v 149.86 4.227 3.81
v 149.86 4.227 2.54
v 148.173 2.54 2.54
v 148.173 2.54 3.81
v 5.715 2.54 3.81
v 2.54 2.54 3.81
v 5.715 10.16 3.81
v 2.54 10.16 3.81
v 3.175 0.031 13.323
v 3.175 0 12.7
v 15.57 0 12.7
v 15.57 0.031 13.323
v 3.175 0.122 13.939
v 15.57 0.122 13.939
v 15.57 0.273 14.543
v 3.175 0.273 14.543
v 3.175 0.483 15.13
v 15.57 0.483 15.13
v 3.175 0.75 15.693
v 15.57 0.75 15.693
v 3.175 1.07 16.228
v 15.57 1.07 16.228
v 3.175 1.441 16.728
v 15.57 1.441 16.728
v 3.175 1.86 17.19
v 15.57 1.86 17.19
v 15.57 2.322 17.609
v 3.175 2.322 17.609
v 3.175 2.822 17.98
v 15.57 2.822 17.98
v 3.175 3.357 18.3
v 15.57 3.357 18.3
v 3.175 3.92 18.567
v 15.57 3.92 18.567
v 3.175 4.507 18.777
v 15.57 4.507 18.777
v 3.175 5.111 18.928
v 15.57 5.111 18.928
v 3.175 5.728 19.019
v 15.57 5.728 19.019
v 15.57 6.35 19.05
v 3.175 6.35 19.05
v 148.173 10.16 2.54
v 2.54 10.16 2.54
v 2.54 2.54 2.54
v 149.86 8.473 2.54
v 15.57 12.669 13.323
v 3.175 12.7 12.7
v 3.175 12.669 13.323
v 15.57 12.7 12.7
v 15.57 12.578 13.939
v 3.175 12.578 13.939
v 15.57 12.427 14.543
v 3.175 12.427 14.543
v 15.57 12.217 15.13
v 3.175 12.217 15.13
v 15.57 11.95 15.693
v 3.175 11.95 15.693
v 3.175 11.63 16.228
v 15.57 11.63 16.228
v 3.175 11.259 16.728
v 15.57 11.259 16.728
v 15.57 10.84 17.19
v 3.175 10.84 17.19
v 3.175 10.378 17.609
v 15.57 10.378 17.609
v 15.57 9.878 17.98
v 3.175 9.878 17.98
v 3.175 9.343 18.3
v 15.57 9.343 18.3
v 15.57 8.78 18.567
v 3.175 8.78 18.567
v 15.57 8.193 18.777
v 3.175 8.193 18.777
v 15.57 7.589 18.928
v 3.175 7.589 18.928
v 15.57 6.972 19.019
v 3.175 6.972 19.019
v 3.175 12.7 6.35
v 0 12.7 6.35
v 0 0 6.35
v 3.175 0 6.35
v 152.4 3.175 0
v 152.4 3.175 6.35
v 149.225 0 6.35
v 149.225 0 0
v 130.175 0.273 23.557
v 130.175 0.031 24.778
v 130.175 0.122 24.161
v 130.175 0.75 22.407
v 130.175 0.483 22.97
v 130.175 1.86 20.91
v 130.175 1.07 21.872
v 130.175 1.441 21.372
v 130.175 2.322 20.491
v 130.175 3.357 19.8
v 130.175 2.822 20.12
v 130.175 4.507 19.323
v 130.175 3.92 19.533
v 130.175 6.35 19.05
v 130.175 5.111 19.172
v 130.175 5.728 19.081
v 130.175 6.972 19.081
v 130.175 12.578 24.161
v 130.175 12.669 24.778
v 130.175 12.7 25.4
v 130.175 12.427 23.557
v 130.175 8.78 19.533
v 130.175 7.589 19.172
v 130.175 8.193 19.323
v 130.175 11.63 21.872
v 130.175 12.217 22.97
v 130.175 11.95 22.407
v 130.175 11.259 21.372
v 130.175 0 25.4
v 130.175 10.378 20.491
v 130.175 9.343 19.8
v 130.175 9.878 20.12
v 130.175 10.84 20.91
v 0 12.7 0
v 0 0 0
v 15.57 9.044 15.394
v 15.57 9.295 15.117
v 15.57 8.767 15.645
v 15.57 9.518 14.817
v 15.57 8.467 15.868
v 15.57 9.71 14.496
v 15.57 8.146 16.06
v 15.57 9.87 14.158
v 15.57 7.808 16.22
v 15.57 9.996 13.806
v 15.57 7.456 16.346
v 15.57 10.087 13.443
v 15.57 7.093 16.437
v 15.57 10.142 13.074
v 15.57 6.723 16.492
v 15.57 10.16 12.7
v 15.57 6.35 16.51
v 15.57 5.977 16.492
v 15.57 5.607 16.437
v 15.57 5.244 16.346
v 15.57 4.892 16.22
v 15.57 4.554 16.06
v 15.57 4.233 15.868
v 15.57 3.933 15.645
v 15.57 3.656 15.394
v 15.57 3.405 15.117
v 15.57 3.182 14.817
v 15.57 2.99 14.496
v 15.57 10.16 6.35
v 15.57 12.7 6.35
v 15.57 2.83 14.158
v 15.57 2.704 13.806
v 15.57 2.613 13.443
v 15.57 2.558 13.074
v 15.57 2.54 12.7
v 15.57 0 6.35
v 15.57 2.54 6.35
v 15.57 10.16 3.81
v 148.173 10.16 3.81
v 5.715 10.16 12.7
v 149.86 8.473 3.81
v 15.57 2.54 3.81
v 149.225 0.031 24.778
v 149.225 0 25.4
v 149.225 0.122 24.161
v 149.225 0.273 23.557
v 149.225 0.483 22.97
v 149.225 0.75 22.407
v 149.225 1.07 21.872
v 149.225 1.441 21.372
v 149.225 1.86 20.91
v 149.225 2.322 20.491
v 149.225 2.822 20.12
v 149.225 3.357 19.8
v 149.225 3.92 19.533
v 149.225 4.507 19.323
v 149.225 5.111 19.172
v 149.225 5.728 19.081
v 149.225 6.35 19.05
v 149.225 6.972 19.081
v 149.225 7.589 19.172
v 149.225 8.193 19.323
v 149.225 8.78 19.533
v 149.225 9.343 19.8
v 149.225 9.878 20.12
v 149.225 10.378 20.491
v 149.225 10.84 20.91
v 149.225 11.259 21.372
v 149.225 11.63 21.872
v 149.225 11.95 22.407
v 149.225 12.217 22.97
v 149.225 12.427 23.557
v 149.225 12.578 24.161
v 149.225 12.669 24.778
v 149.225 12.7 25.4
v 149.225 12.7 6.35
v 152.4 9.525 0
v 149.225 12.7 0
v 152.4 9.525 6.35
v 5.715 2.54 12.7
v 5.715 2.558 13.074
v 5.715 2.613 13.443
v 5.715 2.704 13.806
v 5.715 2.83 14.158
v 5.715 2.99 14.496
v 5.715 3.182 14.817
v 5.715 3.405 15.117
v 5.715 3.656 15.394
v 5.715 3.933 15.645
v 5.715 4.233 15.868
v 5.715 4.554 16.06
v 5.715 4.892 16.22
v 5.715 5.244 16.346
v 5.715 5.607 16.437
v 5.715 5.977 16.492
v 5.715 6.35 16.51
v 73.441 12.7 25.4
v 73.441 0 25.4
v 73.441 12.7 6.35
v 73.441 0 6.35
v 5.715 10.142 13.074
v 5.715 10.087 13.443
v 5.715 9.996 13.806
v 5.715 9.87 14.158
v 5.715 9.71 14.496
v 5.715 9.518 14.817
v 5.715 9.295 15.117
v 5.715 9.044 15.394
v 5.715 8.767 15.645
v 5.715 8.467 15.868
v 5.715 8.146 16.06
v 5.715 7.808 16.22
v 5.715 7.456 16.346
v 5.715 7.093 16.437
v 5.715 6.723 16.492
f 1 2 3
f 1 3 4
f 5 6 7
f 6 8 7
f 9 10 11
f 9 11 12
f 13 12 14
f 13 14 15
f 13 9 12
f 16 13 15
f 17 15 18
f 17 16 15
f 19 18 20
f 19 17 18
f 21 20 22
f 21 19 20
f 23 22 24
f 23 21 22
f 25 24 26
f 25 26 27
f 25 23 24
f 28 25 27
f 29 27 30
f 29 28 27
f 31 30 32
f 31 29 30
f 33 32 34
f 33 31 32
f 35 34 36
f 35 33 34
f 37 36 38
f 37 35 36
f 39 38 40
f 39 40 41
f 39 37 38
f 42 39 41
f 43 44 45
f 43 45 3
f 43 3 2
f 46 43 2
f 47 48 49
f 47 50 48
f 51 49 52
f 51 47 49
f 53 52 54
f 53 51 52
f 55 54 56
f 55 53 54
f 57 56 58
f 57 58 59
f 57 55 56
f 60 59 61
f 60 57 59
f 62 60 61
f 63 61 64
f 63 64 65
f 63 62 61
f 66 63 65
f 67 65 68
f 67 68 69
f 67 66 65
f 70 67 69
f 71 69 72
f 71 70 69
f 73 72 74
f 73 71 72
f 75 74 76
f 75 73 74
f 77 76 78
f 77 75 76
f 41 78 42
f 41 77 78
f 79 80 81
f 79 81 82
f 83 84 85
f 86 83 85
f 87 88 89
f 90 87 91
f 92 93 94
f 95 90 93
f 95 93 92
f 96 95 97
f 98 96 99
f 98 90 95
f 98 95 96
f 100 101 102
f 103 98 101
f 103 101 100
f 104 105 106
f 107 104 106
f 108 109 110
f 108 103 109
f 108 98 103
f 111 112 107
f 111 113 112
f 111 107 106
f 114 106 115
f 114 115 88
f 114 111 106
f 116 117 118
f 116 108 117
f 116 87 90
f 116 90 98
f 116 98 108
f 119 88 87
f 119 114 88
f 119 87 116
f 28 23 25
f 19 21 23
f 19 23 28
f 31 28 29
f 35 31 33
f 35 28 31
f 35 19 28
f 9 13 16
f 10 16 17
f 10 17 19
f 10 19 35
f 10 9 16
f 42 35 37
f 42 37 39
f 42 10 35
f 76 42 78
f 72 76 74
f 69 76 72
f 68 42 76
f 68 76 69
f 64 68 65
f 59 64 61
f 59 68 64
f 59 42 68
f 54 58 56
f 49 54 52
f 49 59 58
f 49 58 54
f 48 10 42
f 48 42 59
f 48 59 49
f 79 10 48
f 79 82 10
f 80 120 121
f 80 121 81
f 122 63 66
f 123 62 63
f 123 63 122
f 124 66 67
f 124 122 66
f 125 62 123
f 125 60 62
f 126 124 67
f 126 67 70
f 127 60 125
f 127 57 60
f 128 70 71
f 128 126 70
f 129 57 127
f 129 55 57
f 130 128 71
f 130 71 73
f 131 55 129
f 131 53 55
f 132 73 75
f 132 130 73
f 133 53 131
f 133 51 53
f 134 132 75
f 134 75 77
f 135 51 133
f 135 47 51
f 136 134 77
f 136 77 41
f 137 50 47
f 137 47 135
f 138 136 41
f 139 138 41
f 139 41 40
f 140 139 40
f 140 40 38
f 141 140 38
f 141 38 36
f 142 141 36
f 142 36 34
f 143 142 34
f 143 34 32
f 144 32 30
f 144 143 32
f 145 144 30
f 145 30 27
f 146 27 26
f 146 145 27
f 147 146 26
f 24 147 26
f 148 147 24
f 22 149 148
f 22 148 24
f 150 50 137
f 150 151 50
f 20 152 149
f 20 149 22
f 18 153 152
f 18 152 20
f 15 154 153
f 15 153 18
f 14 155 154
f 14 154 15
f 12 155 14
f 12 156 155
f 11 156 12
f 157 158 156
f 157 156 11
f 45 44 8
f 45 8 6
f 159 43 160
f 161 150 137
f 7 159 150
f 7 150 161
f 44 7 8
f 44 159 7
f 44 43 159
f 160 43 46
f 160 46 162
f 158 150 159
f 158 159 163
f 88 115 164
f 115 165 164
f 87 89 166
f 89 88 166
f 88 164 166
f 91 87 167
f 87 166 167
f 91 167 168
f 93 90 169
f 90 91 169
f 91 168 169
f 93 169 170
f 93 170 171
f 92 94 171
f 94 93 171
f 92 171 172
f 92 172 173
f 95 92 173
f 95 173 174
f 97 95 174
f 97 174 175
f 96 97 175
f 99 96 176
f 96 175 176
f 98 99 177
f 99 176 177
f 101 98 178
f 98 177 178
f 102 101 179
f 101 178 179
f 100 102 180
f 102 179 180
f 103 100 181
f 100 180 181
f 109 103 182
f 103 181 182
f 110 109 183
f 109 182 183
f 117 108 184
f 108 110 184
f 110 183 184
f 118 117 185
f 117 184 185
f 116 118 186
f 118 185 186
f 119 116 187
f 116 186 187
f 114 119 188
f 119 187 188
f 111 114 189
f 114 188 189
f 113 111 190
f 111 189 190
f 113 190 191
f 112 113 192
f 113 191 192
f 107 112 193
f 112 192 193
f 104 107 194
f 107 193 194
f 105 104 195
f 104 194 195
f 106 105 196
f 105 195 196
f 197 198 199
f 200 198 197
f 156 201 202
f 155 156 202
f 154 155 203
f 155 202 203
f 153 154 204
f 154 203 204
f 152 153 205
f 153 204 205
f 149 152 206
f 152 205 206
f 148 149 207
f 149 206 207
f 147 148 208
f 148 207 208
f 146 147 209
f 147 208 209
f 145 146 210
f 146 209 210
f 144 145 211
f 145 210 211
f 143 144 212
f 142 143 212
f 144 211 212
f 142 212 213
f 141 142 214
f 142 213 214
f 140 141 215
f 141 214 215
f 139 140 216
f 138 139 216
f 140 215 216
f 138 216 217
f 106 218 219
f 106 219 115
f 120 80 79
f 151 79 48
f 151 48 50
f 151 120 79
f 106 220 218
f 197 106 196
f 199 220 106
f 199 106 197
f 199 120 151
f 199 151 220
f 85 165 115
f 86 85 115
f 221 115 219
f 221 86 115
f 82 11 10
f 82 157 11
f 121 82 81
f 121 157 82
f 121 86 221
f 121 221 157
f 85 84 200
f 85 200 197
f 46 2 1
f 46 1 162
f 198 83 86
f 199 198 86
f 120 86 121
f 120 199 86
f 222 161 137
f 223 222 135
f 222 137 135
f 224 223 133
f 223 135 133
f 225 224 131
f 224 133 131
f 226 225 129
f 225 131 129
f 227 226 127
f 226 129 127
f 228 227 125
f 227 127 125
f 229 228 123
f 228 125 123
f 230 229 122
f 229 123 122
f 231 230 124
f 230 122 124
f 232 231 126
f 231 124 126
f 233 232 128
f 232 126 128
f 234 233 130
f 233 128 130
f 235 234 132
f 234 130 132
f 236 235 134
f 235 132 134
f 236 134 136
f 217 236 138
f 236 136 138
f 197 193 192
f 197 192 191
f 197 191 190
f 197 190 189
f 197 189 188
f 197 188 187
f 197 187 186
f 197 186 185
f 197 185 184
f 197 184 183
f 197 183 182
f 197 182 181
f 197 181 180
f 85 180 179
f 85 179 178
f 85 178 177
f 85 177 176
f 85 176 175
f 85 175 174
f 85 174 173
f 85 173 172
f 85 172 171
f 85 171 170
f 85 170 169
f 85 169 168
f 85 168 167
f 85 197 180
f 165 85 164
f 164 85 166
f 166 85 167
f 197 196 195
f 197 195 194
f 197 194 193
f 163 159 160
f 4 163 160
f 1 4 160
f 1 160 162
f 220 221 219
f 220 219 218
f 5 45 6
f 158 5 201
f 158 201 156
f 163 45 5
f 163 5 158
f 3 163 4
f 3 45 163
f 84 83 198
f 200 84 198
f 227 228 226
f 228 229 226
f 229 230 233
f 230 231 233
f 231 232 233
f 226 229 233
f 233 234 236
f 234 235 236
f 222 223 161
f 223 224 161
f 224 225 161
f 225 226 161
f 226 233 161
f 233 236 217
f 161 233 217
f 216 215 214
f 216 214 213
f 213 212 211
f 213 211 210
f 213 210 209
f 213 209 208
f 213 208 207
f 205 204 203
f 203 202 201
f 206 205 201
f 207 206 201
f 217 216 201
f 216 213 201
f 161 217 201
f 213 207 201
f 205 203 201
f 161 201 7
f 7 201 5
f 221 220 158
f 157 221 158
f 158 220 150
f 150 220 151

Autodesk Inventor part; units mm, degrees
ref_plane "YZ Plane" through (0, 0, 0) normal (1, 0, 0) x (0, 1, 0)
ref_plane "XZ Plane" through (0, 0, 0) normal (0, 1, 0) x (-1, 0, 0)
ref_plane "XY Plane" through (0, 0, 0) normal (0, 0, 1) x (1, 0, 0)
sketch "Sketch1" plane through (0, 0, 0) normal (0, 0, 1) x (1, 0, 0)
  line L0 (0, 0) -> (152.4, 0)
  line L1 (152.4, 0) -> (152.4, 12.7)
  line L2 (152.4, 12.7) -> (0, 12.7)
  line L3 (0, 12.7) -> (0, 0)
  dimension "d0" = 152.4
  dimension "d1" = 12.7
sketch "Sketch1 outline for Extrusion1" plane through (0, 0, 0) normal (0, 0, 1) x (1, 0, 0)
  line L0 (0, 12.7) -> (0, 0)
  line L1 (152.4, 12.7) -> (0, 12.7)
  line L2 (152.4, 0) -> (152.4, 12.7)
  line L3 (0, 0) -> (152.4, 0)
extrude "Extrusion1" add sketch "Sketch1 outline for Extrusion1" along normal blind 6.35
chamfer "Chamfer1" distance 3.175 angle 45 2 edges at (152.4, 12.7, 3.175) (152.4, 0, 3.175)
sketch "Sketch2" plane through (0, 0, 6.35) normal (0, 0, 1) x (1, 0, 0)
  line L0 (0, 0) -> (149.225, 0)
  line L1 (149.225, 12.7) -> (0, 12.7)
  line L2 (15.570231, 0) -> (3.175, 0)
  line L3 (3.175, 0) -> (3.175, 12.7)
  line L4 (3.175, 12.7) -> (15.570231, 12.7)
  line L5 (15.570231, 12.7) -> (15.570231, 0)
  point P0 (3.175, 0)
sketch "Sketch2 outline for Extrusion2" plane through (0, 0, 6.35) normal (0, 0, 1) x (1, 0, 0)
  line L0 (15.570231, 0) -> (3.175, 0)
  line L1 (3.175, 0) -> (3.175, 12.7)
  line L2 (3.175, 12.7) -> (15.570231, 12.7)
  line L3 (15.570231, 12.7) -> (15.570231, 0)
extrude "Extrusion2" add sketch "Sketch2 outline for Extrusion2" along normal blind 12.7
fillet "Fillet1" radius 6.35 2 edges at (9.3726, 12.7, 19.05) (9.3726, 0, 19.05)
shell "Shell1" thickness 2.54 removed faces 1 at (15.570231, 8.466667, 10.5834)
sketch "Sketch3" plane through (0, 0, 6.35) normal (0, 0, 1) x (1, 0, 0)
  line L0 (0, 0) -> (149.225, 0)
  line L1 (149.225, 12.7) -> (0, 12.7)
  line L2 (149.225, 0) -> (73.440725, 0)
  line L3 (73.440725, 0) -> (73.440725, 12.7)
  line L4 (73.440725, 12.7) -> (149.225, 12.7)
  line L5 (149.225, 12.7) -> (149.225, 0)
sketch "Sketch3 outline for Extrusion3" plane through (0, 0, 6.35) normal (0, 0, 1) x (1, 0, 0)
  line L0 (149.225, 0) -> (73.440725, 0)
  line L1 (73.440725, 0) -> (73.440725, 12.7)
  line L2 (73.440725, 12.7) -> (149.225, 12.7)
  line L3 (149.225, 12.7) -> (149.225, 0)
extrude "Extrusion3" add sketch "Sketch3 outline for Extrusion3" along normal blind 19.05
sketch "Sketch4" plane through (149.225, 0, 6.35) normal (1, 0, 0) x (0, 0, -1)
  line L0 (-19.05, 12.7) -> (-19.05, 0) projected
  circle A0 centre (-19.05, 6.35) radius 6.35
  point P0 (6.35, 0)
sketch "Sketch4 outline for Extrusion4" plane through (149.225, 0, 6.35) normal (1, 0, 0) x (0, 0, -1)
  circle A0 centre (-19.05, 6.35) radius 6.35
extrude "Extrusion4" cut sketch "Sketch4 outline for Extrusion4" against normal blind 19.05
properties part number "Lolipop"
